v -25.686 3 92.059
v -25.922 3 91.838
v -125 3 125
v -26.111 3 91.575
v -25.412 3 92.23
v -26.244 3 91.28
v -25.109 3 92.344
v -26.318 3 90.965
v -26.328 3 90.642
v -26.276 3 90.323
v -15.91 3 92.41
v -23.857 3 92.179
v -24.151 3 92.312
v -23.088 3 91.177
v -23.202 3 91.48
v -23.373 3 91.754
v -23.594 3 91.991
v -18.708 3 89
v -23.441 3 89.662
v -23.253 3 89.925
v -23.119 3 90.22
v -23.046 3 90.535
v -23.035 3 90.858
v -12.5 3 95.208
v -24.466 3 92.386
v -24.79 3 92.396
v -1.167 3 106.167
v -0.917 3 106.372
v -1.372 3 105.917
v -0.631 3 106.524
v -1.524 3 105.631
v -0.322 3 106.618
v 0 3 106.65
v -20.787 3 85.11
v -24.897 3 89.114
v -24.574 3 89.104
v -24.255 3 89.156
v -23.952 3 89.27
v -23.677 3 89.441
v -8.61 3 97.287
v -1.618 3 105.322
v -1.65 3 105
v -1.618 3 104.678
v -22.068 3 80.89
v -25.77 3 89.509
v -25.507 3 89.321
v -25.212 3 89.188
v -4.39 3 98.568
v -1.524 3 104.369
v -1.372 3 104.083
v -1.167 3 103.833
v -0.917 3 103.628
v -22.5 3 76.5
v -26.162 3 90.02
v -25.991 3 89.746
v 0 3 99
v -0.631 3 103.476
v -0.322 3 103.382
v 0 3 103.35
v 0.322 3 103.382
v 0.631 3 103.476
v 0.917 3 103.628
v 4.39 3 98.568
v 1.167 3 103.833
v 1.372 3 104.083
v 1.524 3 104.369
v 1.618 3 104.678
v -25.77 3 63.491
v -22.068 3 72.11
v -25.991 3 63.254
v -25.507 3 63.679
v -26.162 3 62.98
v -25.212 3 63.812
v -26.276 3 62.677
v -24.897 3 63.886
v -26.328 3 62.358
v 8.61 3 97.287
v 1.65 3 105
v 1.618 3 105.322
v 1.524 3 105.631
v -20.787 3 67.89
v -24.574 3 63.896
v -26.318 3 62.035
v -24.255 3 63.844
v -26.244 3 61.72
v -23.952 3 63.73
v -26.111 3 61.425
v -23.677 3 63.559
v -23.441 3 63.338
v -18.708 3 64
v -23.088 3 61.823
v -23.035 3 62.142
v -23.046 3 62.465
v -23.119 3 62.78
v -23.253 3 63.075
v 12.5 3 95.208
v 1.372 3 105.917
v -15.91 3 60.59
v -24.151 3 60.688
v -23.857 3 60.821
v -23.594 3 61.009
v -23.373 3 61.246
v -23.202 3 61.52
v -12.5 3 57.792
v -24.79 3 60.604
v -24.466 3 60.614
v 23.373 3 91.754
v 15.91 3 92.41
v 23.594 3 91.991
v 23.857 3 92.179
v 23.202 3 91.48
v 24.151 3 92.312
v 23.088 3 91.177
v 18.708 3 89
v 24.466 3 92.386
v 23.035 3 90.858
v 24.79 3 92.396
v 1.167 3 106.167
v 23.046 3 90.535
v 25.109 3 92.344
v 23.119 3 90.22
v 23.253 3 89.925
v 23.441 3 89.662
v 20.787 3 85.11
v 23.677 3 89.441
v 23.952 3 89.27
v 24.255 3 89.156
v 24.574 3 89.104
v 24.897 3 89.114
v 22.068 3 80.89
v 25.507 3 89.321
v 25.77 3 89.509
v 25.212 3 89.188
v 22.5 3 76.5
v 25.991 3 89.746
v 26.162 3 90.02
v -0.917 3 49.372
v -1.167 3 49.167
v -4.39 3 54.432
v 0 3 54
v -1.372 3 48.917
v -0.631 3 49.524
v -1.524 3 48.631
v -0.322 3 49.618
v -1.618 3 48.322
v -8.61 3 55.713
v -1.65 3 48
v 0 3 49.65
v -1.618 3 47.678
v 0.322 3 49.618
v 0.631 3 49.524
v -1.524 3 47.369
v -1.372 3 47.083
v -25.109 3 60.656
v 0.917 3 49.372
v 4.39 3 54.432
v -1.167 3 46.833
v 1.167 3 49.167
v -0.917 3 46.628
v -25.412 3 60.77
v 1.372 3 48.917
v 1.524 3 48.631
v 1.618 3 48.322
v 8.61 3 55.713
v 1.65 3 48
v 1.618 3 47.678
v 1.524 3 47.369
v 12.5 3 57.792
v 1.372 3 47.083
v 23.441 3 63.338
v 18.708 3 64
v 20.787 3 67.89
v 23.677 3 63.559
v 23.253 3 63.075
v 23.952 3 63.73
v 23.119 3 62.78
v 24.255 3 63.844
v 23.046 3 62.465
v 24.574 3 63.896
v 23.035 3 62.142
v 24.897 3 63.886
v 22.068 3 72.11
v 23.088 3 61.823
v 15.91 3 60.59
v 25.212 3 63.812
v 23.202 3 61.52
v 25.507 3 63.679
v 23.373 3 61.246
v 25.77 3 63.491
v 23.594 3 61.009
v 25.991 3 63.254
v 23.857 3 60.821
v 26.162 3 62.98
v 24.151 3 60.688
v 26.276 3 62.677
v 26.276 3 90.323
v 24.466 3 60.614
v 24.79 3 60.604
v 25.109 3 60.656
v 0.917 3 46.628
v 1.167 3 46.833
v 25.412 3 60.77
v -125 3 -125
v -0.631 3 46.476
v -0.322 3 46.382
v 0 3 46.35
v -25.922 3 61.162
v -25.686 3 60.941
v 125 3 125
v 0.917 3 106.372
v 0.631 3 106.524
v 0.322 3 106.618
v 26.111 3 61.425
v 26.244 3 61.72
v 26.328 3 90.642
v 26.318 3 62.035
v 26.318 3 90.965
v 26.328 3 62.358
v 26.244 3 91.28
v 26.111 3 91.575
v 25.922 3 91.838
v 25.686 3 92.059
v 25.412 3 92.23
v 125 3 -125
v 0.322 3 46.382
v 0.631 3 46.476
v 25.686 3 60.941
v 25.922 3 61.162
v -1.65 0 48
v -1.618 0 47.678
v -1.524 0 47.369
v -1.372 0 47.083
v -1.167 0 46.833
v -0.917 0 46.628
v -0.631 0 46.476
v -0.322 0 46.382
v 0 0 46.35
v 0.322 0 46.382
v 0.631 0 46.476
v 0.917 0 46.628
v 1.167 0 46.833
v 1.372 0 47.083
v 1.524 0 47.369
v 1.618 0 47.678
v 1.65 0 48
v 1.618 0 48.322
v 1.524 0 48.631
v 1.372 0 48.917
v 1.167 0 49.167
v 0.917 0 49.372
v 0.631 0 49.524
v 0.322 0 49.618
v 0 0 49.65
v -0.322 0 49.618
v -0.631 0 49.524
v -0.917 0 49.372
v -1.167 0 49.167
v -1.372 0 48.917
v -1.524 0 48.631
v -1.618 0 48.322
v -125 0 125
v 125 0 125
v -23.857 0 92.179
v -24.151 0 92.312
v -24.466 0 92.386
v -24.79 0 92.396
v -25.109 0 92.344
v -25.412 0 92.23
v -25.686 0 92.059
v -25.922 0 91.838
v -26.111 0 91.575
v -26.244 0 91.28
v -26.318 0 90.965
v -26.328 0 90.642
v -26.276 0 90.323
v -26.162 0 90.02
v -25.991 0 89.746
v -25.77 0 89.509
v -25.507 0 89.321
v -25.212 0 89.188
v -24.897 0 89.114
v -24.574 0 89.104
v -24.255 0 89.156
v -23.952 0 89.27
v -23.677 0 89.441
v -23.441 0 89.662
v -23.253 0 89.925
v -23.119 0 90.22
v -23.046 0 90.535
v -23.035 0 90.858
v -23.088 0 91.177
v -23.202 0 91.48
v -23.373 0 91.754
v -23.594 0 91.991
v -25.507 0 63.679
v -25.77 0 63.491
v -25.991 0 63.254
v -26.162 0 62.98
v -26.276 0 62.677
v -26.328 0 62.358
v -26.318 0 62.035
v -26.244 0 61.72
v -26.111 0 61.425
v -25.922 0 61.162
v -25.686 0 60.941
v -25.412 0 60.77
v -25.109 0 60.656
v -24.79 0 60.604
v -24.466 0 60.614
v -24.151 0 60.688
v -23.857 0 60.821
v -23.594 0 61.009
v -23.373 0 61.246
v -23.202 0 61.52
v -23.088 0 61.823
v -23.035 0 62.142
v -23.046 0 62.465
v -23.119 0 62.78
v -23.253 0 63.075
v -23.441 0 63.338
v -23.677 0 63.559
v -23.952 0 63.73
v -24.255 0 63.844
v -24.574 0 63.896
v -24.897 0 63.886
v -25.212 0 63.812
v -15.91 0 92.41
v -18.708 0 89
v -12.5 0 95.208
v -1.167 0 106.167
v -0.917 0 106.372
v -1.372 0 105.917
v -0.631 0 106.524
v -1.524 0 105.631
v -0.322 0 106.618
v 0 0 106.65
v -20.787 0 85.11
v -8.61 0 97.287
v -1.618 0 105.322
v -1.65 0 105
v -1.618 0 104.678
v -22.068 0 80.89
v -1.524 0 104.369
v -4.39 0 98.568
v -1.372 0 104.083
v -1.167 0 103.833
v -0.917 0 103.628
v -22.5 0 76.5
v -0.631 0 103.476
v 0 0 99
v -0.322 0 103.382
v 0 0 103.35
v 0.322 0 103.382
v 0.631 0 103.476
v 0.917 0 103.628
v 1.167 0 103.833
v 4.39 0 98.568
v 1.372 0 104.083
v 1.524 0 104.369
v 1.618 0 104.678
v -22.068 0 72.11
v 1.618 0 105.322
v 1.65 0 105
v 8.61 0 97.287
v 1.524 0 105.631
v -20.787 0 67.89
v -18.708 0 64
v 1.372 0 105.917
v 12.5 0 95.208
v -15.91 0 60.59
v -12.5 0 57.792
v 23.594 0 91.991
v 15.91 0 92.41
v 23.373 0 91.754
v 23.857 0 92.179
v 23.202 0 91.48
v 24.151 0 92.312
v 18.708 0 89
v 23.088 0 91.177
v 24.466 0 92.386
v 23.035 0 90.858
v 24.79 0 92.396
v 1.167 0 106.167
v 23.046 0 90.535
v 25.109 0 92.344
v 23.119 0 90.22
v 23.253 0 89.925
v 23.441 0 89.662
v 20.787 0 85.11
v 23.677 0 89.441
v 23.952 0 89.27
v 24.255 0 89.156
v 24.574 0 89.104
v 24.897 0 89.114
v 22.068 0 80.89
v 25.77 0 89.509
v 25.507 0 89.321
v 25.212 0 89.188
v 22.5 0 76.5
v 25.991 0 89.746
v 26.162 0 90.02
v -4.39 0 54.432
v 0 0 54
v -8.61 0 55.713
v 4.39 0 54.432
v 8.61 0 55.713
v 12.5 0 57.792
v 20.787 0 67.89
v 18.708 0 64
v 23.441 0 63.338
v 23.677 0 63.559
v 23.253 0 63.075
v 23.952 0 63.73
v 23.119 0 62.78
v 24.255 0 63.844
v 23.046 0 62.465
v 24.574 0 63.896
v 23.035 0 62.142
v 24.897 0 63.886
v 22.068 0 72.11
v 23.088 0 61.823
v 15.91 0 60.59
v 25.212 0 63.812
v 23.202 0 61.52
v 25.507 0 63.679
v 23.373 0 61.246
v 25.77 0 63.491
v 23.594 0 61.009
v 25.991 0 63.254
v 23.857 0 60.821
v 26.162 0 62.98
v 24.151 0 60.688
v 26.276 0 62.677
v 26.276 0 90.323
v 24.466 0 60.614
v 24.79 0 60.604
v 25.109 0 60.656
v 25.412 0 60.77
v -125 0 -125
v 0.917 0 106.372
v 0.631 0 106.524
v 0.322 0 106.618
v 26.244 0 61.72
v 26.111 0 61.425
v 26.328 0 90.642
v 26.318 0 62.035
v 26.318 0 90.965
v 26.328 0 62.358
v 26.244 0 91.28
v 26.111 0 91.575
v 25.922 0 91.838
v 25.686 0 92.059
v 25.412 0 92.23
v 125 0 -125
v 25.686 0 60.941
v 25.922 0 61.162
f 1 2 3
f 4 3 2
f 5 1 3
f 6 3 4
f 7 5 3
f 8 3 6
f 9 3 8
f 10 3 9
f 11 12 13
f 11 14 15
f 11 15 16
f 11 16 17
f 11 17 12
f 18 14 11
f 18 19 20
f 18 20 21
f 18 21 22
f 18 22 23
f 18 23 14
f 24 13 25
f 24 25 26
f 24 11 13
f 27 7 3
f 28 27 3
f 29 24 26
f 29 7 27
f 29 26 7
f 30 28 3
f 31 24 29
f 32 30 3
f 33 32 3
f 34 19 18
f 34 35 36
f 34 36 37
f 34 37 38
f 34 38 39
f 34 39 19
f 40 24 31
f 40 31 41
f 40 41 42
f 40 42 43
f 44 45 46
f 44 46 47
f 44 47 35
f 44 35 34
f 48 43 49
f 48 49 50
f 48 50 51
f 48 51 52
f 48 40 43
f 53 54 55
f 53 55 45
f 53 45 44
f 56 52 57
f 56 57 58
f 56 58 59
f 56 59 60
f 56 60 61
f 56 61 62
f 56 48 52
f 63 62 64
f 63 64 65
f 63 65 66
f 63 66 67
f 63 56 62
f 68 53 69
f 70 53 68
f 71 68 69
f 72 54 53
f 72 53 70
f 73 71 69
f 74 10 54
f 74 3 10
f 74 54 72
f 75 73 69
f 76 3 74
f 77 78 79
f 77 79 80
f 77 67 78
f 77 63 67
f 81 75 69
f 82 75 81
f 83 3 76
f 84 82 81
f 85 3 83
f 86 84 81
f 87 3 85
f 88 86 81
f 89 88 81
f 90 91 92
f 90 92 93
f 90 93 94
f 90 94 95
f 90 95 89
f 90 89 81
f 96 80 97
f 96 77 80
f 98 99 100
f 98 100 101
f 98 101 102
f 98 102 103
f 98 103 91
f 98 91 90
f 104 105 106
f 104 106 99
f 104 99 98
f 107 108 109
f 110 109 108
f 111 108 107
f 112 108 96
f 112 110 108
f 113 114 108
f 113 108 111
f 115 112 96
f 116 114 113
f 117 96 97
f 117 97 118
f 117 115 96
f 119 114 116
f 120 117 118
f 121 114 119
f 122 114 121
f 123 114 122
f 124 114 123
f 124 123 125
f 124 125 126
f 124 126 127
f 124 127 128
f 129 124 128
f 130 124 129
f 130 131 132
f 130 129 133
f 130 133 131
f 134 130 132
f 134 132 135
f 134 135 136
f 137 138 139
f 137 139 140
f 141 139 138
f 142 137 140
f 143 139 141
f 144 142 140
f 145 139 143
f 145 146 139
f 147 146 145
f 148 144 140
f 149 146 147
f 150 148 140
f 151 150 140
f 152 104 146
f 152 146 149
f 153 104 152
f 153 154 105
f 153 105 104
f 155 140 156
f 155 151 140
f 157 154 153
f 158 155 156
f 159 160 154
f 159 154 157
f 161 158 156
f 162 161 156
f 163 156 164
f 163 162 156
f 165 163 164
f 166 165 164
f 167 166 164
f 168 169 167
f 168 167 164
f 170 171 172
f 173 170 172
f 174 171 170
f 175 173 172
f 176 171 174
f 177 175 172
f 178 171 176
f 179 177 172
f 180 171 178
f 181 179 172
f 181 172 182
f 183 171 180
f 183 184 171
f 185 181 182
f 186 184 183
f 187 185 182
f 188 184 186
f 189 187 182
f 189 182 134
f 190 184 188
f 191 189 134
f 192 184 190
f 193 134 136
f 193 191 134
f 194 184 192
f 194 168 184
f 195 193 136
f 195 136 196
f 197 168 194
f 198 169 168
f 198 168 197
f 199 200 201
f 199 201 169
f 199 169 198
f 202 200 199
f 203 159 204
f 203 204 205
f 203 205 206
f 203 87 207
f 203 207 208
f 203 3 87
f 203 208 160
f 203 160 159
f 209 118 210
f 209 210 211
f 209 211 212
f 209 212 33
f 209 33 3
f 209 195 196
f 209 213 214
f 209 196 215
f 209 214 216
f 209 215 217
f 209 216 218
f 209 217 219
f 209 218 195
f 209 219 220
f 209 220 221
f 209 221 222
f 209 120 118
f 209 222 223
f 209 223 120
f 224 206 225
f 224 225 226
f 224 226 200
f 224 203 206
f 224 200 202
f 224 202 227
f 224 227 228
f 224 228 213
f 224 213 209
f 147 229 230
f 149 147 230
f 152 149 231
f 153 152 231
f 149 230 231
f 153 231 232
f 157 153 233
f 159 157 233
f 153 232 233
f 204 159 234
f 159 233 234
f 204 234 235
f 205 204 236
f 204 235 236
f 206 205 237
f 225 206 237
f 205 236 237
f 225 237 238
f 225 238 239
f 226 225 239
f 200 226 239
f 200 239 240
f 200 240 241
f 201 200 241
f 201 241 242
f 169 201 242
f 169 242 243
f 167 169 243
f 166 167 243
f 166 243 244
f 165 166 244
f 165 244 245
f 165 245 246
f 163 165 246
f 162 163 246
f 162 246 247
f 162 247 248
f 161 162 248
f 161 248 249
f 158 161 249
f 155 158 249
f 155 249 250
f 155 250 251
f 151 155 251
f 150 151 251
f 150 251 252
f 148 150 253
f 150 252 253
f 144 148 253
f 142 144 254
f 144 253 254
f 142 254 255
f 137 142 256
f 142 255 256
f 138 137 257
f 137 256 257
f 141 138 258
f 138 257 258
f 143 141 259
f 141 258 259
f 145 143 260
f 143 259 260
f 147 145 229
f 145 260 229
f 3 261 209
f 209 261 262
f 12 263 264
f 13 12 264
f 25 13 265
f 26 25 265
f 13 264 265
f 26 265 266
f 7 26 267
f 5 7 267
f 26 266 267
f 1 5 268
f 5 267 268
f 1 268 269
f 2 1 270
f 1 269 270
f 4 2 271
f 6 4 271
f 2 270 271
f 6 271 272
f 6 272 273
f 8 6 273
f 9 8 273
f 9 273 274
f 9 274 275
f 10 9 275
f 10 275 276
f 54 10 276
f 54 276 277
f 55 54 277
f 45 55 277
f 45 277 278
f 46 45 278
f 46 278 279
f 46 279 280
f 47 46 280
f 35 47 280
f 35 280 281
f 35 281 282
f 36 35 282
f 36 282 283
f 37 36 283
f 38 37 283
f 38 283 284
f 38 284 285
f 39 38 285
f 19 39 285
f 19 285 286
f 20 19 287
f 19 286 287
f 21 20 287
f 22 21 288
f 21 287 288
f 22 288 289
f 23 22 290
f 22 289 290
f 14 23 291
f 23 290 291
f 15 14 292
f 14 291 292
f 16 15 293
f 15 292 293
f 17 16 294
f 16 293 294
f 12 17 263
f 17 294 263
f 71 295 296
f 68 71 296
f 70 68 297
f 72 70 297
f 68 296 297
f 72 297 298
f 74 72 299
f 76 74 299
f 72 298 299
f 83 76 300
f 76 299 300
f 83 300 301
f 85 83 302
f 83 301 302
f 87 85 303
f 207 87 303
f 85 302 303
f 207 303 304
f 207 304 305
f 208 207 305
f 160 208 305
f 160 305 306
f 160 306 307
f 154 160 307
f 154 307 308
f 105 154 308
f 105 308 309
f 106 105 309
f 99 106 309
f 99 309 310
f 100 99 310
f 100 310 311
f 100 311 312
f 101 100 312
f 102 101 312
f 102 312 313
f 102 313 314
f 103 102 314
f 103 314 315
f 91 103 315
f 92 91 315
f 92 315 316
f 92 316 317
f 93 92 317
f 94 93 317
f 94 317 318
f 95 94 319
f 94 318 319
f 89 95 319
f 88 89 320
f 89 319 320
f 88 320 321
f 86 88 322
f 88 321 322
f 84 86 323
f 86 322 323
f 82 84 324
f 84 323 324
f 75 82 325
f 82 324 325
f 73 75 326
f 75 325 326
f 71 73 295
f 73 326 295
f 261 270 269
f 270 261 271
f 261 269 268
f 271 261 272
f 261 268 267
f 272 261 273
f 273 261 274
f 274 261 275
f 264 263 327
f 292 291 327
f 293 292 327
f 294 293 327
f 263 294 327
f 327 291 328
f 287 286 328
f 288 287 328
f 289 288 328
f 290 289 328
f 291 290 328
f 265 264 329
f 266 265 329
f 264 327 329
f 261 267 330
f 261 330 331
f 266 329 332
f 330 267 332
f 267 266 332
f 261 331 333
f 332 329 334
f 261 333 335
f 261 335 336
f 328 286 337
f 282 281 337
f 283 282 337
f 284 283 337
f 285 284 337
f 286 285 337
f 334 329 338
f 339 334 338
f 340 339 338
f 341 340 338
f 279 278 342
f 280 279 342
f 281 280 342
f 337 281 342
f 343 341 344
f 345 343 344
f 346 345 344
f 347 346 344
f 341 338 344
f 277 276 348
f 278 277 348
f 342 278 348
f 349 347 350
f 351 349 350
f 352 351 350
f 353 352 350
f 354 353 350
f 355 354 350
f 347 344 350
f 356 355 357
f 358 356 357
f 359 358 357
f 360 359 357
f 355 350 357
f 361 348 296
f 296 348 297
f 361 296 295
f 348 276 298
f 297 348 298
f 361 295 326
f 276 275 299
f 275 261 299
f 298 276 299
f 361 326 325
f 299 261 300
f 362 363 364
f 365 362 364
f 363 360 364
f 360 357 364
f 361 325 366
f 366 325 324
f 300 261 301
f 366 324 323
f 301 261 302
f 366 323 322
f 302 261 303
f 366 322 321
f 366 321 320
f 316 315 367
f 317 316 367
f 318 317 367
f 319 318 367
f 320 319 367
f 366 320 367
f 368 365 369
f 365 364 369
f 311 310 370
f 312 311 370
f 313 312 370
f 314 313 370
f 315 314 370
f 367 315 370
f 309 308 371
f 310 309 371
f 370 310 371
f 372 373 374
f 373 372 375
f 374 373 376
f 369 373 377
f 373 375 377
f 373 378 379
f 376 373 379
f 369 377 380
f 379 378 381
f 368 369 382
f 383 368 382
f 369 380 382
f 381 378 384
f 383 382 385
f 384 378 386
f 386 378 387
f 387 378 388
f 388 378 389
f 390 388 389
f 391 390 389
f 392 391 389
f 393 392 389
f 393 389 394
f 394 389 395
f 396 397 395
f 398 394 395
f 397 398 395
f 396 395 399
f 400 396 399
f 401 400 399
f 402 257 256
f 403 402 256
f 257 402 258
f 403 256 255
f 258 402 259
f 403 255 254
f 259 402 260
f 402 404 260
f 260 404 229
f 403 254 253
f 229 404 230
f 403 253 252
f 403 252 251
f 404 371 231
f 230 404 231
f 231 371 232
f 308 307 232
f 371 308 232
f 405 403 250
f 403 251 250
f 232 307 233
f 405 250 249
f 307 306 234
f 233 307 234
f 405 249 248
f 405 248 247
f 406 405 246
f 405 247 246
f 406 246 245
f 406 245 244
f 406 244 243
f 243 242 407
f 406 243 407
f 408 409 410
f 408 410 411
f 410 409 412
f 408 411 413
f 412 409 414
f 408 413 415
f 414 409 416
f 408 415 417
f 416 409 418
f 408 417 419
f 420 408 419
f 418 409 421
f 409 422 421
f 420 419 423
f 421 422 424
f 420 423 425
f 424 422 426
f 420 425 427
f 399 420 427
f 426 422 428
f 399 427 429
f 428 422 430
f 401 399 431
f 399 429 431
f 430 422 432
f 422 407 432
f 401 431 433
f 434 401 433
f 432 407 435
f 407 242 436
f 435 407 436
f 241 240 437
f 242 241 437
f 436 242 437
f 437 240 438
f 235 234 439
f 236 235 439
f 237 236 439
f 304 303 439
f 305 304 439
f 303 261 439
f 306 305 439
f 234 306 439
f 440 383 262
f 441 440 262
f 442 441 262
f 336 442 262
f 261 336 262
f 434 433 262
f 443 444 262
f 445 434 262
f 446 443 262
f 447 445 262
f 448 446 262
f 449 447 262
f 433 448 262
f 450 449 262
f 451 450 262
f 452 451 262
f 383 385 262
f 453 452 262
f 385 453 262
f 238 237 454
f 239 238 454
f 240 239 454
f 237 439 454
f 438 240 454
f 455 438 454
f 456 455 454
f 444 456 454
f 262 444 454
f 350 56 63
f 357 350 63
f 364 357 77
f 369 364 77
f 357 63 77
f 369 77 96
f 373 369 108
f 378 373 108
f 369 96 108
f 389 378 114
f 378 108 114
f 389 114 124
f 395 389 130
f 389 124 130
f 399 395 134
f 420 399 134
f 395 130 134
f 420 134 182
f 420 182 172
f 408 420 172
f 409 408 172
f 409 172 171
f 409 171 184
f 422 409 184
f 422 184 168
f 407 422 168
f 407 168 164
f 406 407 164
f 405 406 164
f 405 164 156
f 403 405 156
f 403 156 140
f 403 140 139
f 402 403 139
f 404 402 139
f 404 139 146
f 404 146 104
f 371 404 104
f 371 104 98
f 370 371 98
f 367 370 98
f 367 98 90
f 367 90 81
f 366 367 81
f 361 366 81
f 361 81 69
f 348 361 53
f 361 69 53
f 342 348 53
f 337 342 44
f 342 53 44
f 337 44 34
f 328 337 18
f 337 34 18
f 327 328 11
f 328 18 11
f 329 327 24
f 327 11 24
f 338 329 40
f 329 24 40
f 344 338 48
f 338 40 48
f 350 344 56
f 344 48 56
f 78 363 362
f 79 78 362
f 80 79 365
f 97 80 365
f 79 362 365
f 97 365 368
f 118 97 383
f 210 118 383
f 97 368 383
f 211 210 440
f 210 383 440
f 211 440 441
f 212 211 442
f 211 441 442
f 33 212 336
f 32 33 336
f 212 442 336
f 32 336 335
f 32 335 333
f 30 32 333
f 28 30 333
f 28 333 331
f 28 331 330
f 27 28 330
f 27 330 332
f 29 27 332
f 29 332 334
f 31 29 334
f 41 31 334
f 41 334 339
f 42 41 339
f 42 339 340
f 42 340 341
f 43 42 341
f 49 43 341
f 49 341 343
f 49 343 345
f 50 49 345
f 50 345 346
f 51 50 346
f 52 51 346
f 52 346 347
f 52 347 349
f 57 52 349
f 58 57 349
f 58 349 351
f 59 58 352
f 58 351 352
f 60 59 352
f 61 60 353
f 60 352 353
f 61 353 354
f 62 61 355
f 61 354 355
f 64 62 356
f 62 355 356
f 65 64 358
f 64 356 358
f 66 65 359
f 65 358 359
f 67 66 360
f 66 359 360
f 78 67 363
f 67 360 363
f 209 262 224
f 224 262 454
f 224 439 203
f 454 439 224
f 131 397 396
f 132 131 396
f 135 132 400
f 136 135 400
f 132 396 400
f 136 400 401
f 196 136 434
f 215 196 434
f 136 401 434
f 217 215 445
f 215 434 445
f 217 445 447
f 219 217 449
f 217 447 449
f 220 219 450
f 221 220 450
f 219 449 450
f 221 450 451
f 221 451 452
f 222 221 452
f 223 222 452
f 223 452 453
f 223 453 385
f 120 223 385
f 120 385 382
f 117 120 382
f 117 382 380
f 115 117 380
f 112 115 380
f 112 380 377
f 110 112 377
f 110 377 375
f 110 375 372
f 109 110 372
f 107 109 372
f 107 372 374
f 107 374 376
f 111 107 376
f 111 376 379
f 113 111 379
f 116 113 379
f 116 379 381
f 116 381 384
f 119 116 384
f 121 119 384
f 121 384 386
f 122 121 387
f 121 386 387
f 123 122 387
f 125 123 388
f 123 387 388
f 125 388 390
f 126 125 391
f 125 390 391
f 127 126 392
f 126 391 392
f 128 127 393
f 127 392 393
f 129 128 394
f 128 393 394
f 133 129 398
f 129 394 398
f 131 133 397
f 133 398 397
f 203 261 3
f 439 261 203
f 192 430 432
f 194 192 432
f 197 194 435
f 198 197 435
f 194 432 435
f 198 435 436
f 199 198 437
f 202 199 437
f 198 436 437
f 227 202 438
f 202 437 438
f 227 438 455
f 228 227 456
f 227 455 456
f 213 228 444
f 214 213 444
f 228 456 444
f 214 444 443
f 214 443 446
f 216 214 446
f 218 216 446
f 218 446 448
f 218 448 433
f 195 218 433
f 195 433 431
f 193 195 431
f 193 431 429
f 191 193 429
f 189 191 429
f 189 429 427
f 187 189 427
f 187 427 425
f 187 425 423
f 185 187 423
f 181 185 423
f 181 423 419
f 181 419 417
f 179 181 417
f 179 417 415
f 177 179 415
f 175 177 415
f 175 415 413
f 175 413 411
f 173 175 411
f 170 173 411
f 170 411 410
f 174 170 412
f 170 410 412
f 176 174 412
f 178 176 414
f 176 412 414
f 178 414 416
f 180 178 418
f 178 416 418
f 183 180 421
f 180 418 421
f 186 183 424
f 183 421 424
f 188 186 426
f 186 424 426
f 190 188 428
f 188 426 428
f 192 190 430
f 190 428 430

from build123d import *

# Parameters (mm, degrees)
SKETCH_1_W               = 250
SKETCH_1_H               = 250
EXTRUDE_1_DEPTH          = 3
HOLE_WIZARD_1_D          = 3.3
PATTERN_CIRCULAR_1_COUNT = 6
SKETCH_5_R               = 22.5
CUT_EXTRUDE_1_DEPTH      = 10


with BuildPart() as part:
    # 草图1 → 凸台-拉伸1 (new body)
    with BuildSketch(Plane(origin=(0, 0, 0), x_dir=(1, 0, 0), z_dir=(0, 1, 0))):
        Rectangle(SKETCH_1_W, SKETCH_1_H)
    extrude(amount=EXTRUDE_1_DEPTH)

    # 孔1 (through all)
    with Locations(Plane(origin=(0, 3, 0), x_dir=(1, 0, 0), z_dir=(0, 1, 0))):
        with Locations((0, -48)):
            hole_wizard_1 = Hole(HOLE_WIZARD_1_D / 2)

    # 阵列(圆周)1: 孔1 ×6 about axis
    pattern_circular_1_axis = Axis((0, 0, 76.5), (0, 1, 0))
    for i in range(1, PATTERN_CIRCULAR_1_COUNT):
        add(hole_wizard_1.rotate(pattern_circular_1_axis, i * 360 / PATTERN_CIRCULAR_1_COUNT), mode=Mode.SUBTRACT)

    # 草图5 → 切除-拉伸1 (cut)
    with BuildSketch(Plane(origin=(0, 3, 0), x_dir=(1, 0, 0), z_dir=(0, 1, 0))):
        with Locations(Location((0, -76.5, 0), (0, 0, 270))):
            Circle(SKETCH_5_R)
    extrude(amount=-CUT_EXTRUDE_1_DEPTH, mode=Mode.SUBTRACT)


solid = part.part
